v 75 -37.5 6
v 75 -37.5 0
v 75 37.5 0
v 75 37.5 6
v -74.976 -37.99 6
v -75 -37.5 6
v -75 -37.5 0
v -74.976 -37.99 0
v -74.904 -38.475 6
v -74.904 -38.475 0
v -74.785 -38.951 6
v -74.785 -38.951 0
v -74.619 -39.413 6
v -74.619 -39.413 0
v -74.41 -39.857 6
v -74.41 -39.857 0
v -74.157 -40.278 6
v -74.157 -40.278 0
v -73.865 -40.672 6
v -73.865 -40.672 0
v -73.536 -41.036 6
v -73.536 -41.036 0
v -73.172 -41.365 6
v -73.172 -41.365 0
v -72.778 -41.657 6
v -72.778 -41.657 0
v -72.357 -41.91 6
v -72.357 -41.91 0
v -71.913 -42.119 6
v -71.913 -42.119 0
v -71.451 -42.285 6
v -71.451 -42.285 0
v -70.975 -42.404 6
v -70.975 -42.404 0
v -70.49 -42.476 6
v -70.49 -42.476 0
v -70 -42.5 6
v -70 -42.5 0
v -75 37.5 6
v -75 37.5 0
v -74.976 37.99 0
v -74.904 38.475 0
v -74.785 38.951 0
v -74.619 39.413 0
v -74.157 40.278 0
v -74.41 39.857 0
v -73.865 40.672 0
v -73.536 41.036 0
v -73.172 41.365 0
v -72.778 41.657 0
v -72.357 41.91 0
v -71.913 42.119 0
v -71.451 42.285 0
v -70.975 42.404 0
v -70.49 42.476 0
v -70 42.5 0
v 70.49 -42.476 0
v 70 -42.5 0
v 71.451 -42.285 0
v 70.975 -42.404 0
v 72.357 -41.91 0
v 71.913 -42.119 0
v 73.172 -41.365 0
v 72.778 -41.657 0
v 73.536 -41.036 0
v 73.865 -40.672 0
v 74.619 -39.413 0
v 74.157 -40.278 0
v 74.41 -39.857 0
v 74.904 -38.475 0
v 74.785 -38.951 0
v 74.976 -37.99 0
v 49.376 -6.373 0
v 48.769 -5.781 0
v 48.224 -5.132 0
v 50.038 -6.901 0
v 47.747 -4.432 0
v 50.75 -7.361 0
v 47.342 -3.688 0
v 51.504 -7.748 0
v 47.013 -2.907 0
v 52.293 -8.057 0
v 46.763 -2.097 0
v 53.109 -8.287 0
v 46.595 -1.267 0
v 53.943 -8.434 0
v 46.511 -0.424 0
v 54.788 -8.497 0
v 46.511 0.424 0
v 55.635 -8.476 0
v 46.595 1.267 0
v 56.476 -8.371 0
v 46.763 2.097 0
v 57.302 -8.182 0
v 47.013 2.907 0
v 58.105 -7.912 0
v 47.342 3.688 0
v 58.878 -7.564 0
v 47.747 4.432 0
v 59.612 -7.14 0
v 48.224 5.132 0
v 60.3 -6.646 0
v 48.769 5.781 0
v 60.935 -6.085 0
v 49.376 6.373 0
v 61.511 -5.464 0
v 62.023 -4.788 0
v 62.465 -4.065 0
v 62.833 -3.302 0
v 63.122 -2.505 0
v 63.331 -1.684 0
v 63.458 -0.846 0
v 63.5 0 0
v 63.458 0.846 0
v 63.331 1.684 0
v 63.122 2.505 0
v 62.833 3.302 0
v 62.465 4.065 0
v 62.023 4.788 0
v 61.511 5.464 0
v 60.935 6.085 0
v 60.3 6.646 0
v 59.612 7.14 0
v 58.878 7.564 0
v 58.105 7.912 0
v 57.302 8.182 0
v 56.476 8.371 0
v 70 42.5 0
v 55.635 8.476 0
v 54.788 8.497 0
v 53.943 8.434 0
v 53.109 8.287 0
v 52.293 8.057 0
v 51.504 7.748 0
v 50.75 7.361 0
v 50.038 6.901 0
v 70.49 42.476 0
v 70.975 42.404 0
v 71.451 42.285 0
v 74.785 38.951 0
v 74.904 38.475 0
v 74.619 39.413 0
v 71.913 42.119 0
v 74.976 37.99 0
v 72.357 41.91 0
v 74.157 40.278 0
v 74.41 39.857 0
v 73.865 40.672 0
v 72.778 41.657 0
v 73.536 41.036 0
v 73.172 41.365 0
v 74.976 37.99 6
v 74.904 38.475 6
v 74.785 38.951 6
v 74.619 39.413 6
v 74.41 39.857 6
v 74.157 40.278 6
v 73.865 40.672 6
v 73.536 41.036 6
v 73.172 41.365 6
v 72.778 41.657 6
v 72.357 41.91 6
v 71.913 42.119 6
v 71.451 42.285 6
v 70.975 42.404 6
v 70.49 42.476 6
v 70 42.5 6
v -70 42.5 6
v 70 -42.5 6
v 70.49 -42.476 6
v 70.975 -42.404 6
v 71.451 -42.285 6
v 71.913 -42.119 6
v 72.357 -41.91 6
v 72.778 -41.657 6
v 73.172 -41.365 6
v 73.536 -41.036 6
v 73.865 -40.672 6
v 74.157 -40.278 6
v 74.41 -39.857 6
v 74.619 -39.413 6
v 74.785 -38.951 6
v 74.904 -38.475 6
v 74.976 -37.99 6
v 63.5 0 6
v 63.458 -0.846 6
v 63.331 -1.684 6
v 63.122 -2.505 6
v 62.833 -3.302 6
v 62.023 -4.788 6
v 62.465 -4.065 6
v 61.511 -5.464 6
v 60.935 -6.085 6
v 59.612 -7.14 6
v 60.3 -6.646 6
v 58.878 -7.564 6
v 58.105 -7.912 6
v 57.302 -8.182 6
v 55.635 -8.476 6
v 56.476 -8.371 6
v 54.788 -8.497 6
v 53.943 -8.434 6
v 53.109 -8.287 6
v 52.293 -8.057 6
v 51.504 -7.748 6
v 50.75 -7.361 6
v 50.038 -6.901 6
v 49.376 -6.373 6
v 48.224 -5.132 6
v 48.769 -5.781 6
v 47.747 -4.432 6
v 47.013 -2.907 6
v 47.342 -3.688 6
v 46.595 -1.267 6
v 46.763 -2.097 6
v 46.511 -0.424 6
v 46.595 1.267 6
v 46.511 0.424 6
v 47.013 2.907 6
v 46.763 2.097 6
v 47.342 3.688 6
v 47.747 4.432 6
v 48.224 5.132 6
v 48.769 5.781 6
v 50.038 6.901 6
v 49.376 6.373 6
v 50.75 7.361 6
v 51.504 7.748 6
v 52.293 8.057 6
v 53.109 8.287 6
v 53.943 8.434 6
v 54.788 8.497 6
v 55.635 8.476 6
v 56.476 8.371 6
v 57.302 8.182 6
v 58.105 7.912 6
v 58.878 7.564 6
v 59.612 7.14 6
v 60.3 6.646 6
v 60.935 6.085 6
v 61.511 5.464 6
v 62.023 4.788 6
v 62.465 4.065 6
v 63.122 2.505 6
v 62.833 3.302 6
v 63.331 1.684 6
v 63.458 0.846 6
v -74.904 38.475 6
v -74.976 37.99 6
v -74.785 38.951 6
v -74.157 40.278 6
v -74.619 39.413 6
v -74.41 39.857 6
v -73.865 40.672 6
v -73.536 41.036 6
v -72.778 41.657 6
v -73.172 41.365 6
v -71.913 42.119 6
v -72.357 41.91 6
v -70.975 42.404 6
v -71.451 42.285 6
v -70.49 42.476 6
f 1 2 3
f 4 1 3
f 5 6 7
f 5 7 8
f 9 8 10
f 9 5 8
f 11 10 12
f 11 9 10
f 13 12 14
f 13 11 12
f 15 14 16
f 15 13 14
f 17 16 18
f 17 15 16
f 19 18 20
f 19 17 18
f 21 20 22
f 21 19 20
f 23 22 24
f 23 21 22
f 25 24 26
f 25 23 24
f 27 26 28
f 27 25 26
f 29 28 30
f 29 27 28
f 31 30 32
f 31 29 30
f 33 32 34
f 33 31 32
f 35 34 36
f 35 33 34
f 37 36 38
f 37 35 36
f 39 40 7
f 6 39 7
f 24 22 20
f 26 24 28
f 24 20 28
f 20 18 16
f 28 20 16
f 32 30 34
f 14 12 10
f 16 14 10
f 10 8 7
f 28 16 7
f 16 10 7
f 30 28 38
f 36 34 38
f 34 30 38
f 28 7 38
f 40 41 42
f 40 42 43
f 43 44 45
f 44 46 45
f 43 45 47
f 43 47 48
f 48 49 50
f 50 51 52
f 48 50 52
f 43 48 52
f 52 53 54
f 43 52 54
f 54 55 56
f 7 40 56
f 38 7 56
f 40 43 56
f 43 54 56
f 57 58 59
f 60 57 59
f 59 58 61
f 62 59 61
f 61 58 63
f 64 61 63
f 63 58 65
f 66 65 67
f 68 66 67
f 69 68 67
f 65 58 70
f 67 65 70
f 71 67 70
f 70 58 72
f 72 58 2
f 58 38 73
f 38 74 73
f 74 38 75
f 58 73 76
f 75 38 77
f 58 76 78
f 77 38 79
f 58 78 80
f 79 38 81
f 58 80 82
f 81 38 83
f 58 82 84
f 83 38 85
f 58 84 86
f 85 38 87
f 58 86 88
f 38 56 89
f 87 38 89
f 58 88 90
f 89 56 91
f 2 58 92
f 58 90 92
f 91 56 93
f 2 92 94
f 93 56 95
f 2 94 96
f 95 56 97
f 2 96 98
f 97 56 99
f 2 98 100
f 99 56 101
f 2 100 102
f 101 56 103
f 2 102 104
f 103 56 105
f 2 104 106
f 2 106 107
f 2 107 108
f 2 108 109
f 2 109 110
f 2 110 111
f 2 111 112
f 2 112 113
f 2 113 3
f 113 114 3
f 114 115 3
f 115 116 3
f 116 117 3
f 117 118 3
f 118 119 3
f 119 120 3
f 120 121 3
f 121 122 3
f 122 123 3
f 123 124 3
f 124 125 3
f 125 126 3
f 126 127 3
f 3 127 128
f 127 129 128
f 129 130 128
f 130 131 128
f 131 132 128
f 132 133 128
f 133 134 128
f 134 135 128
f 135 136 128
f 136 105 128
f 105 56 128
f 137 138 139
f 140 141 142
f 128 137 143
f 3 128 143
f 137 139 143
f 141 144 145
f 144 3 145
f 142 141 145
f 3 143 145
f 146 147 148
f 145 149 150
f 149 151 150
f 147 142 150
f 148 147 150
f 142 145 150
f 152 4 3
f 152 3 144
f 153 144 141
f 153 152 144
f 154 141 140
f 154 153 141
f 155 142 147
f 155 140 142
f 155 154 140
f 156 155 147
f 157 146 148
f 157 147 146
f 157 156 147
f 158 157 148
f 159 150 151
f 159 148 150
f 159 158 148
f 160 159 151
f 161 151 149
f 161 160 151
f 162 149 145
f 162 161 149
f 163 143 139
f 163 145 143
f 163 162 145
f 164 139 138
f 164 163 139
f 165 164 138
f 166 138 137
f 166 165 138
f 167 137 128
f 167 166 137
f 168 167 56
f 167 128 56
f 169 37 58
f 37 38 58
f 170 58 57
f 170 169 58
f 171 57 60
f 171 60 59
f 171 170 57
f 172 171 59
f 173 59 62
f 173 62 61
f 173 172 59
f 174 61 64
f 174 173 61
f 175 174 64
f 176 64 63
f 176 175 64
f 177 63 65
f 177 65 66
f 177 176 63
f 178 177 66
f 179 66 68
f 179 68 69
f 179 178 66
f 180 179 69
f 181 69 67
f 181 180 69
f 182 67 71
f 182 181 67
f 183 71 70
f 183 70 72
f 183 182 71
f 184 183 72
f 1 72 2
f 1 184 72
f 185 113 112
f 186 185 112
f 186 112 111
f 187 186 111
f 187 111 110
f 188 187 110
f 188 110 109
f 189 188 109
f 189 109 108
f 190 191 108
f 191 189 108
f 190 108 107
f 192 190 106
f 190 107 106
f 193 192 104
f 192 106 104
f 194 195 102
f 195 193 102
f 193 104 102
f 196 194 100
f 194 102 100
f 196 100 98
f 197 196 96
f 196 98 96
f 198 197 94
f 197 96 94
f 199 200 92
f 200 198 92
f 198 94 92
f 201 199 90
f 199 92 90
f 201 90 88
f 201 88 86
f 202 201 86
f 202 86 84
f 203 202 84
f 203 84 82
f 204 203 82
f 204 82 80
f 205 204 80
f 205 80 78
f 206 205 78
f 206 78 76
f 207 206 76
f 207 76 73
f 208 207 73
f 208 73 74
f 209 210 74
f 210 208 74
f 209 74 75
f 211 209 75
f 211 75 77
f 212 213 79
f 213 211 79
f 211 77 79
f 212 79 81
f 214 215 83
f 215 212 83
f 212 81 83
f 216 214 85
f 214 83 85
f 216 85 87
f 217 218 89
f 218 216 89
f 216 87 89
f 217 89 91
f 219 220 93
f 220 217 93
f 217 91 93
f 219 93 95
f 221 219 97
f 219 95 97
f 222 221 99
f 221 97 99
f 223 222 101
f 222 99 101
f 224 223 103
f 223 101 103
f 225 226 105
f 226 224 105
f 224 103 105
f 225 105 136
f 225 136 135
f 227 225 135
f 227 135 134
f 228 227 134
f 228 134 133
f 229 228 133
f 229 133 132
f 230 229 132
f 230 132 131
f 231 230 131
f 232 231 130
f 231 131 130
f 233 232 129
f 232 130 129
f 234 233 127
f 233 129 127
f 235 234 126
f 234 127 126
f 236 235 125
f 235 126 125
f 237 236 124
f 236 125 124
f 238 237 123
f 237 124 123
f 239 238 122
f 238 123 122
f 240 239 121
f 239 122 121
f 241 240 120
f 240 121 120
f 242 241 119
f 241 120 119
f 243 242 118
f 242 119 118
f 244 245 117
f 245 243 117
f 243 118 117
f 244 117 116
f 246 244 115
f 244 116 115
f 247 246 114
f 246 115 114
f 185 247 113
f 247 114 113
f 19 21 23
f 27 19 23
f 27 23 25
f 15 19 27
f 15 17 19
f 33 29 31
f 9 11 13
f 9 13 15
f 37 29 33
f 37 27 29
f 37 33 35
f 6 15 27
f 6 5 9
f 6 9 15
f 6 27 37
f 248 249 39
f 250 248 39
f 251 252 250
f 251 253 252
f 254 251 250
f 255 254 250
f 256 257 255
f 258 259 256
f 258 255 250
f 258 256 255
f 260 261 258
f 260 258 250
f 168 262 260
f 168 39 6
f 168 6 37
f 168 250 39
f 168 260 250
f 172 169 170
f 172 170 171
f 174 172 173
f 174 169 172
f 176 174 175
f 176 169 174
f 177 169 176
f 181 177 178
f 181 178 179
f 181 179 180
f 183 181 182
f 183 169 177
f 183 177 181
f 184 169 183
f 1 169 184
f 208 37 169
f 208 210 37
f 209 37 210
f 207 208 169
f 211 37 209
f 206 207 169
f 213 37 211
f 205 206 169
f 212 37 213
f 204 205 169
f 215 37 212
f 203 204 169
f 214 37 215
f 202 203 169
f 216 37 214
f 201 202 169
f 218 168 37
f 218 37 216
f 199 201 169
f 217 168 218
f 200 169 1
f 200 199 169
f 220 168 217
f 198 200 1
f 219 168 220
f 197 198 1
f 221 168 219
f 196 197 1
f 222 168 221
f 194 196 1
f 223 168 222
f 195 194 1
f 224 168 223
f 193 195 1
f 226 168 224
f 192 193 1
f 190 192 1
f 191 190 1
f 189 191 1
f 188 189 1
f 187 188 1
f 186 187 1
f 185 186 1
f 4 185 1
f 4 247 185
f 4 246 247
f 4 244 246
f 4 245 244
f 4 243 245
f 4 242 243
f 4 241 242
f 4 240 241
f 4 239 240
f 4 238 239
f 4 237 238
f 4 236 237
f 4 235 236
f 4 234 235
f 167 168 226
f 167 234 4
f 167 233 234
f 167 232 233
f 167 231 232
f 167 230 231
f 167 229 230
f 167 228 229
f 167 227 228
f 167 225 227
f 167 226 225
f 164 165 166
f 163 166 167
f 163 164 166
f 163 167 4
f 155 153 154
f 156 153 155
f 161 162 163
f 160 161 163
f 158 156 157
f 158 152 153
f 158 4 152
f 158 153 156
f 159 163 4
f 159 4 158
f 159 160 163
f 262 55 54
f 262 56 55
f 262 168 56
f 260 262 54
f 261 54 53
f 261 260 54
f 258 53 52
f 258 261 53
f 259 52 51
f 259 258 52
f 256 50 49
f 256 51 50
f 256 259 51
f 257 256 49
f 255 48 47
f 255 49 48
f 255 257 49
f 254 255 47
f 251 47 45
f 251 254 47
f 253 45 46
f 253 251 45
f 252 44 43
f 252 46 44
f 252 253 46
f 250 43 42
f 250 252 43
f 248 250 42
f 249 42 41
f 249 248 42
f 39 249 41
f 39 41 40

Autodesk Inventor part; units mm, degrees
ref_plane "YZ Plane" through (0, 0, 0) normal (1, 0, 0) x (0, 1, 0)
ref_plane "XZ Plane" through (0, 0, 0) normal (0, 1, 0) x (-1, 0, 0)
ref_plane "XY Plane" through (0, 0, 0) normal (0, 0, 1) x (1, 0, 0)
sketch "Sketch1" plane through (0, 0, 0) normal (0, 0, 1) x (1, 0, 0)
  line L0 (-75, -42.5) -> (75, -42.5)
  line L1 (75, -42.5) -> (75, 42.5)
  line L2 (75, 42.5) -> (-75, 42.5)
  line L3 (-75, 42.5) -> (-75, -42.5)
  line L4 (-75, -42.5) -> (75, 42.5) construction
  line L5 (75, -42.5) -> (-75, 42.5) construction
  circle A0 centre (55, -22.5) radius 8.5
  circle A1 centre (55, 22.5) radius 8.5
  line L6 (0, 0) -> (75, 0) construction
  circle A2 centre (55, 0) radius 8.5
  dimension "d0" = 150
  dimension "d1" = 85
  dimension "d23" = 17
  dimension "d25" = 20
  dimension "d26" = 20
extrude "Plate1" add sketch "Sketch1" along normal blind 6 contours L3 L2 L1 L0 | A0 | A1
sketch "Sketch5" plane through (0, 0, 6) normal (0, 0, 1) x (1, 0, 0)
  line L0 (75, -42.5) -> (-75, -42.5) projected
  line L1 (-75, -42.5) -> (-75, 42.5) projected
  line L2 (-75, 42.5) -> (75, 42.5) projected
  circle A0 centre (-32.5, 0) radius 42.5
  circle A1 centre (-32.5, 0) radius 5
  point P0 (0, 0)
  point P1 (50, -55)
  point P2 (-50, -55)
  point P3 (-70, -35)
  point P4 (-70, 35)
  point P5 (-50, 55)
  point P6 (50, 55)
  dimension "d27" = 10
extrude "Extrusion2" [suppressed]
fillet "Corner Round2" radius 5 4 edges at (-75, 42.5, 3) (-75, -42.5, 3) (75, -42.5, 3) (75, 42.5, 3)
equation "\"d26\" = d25"
equation "\"d2\" = Thickness"
equation "\"BendReliefWidth\" = Thickness"
equation "\"BendReliefDepth\" = 0.5 * Thickness"
equation "\"CornerReliefSize\" = 4 * Thickness"
equation "\"MinimumRemnant\" = 2 * Thickness"
equation "\"TransitionRadius\" = BendRadius"
equation "\"JacobiRadiusSize\" = BendRadius"
equation "\"GapSize\" = Thickness"
equation "\"Thickness\" = 6"
equation "\"BendRadius\" = 5"
properties part number "SLM 1695 leg floor plate" material "Stainless Steel"
